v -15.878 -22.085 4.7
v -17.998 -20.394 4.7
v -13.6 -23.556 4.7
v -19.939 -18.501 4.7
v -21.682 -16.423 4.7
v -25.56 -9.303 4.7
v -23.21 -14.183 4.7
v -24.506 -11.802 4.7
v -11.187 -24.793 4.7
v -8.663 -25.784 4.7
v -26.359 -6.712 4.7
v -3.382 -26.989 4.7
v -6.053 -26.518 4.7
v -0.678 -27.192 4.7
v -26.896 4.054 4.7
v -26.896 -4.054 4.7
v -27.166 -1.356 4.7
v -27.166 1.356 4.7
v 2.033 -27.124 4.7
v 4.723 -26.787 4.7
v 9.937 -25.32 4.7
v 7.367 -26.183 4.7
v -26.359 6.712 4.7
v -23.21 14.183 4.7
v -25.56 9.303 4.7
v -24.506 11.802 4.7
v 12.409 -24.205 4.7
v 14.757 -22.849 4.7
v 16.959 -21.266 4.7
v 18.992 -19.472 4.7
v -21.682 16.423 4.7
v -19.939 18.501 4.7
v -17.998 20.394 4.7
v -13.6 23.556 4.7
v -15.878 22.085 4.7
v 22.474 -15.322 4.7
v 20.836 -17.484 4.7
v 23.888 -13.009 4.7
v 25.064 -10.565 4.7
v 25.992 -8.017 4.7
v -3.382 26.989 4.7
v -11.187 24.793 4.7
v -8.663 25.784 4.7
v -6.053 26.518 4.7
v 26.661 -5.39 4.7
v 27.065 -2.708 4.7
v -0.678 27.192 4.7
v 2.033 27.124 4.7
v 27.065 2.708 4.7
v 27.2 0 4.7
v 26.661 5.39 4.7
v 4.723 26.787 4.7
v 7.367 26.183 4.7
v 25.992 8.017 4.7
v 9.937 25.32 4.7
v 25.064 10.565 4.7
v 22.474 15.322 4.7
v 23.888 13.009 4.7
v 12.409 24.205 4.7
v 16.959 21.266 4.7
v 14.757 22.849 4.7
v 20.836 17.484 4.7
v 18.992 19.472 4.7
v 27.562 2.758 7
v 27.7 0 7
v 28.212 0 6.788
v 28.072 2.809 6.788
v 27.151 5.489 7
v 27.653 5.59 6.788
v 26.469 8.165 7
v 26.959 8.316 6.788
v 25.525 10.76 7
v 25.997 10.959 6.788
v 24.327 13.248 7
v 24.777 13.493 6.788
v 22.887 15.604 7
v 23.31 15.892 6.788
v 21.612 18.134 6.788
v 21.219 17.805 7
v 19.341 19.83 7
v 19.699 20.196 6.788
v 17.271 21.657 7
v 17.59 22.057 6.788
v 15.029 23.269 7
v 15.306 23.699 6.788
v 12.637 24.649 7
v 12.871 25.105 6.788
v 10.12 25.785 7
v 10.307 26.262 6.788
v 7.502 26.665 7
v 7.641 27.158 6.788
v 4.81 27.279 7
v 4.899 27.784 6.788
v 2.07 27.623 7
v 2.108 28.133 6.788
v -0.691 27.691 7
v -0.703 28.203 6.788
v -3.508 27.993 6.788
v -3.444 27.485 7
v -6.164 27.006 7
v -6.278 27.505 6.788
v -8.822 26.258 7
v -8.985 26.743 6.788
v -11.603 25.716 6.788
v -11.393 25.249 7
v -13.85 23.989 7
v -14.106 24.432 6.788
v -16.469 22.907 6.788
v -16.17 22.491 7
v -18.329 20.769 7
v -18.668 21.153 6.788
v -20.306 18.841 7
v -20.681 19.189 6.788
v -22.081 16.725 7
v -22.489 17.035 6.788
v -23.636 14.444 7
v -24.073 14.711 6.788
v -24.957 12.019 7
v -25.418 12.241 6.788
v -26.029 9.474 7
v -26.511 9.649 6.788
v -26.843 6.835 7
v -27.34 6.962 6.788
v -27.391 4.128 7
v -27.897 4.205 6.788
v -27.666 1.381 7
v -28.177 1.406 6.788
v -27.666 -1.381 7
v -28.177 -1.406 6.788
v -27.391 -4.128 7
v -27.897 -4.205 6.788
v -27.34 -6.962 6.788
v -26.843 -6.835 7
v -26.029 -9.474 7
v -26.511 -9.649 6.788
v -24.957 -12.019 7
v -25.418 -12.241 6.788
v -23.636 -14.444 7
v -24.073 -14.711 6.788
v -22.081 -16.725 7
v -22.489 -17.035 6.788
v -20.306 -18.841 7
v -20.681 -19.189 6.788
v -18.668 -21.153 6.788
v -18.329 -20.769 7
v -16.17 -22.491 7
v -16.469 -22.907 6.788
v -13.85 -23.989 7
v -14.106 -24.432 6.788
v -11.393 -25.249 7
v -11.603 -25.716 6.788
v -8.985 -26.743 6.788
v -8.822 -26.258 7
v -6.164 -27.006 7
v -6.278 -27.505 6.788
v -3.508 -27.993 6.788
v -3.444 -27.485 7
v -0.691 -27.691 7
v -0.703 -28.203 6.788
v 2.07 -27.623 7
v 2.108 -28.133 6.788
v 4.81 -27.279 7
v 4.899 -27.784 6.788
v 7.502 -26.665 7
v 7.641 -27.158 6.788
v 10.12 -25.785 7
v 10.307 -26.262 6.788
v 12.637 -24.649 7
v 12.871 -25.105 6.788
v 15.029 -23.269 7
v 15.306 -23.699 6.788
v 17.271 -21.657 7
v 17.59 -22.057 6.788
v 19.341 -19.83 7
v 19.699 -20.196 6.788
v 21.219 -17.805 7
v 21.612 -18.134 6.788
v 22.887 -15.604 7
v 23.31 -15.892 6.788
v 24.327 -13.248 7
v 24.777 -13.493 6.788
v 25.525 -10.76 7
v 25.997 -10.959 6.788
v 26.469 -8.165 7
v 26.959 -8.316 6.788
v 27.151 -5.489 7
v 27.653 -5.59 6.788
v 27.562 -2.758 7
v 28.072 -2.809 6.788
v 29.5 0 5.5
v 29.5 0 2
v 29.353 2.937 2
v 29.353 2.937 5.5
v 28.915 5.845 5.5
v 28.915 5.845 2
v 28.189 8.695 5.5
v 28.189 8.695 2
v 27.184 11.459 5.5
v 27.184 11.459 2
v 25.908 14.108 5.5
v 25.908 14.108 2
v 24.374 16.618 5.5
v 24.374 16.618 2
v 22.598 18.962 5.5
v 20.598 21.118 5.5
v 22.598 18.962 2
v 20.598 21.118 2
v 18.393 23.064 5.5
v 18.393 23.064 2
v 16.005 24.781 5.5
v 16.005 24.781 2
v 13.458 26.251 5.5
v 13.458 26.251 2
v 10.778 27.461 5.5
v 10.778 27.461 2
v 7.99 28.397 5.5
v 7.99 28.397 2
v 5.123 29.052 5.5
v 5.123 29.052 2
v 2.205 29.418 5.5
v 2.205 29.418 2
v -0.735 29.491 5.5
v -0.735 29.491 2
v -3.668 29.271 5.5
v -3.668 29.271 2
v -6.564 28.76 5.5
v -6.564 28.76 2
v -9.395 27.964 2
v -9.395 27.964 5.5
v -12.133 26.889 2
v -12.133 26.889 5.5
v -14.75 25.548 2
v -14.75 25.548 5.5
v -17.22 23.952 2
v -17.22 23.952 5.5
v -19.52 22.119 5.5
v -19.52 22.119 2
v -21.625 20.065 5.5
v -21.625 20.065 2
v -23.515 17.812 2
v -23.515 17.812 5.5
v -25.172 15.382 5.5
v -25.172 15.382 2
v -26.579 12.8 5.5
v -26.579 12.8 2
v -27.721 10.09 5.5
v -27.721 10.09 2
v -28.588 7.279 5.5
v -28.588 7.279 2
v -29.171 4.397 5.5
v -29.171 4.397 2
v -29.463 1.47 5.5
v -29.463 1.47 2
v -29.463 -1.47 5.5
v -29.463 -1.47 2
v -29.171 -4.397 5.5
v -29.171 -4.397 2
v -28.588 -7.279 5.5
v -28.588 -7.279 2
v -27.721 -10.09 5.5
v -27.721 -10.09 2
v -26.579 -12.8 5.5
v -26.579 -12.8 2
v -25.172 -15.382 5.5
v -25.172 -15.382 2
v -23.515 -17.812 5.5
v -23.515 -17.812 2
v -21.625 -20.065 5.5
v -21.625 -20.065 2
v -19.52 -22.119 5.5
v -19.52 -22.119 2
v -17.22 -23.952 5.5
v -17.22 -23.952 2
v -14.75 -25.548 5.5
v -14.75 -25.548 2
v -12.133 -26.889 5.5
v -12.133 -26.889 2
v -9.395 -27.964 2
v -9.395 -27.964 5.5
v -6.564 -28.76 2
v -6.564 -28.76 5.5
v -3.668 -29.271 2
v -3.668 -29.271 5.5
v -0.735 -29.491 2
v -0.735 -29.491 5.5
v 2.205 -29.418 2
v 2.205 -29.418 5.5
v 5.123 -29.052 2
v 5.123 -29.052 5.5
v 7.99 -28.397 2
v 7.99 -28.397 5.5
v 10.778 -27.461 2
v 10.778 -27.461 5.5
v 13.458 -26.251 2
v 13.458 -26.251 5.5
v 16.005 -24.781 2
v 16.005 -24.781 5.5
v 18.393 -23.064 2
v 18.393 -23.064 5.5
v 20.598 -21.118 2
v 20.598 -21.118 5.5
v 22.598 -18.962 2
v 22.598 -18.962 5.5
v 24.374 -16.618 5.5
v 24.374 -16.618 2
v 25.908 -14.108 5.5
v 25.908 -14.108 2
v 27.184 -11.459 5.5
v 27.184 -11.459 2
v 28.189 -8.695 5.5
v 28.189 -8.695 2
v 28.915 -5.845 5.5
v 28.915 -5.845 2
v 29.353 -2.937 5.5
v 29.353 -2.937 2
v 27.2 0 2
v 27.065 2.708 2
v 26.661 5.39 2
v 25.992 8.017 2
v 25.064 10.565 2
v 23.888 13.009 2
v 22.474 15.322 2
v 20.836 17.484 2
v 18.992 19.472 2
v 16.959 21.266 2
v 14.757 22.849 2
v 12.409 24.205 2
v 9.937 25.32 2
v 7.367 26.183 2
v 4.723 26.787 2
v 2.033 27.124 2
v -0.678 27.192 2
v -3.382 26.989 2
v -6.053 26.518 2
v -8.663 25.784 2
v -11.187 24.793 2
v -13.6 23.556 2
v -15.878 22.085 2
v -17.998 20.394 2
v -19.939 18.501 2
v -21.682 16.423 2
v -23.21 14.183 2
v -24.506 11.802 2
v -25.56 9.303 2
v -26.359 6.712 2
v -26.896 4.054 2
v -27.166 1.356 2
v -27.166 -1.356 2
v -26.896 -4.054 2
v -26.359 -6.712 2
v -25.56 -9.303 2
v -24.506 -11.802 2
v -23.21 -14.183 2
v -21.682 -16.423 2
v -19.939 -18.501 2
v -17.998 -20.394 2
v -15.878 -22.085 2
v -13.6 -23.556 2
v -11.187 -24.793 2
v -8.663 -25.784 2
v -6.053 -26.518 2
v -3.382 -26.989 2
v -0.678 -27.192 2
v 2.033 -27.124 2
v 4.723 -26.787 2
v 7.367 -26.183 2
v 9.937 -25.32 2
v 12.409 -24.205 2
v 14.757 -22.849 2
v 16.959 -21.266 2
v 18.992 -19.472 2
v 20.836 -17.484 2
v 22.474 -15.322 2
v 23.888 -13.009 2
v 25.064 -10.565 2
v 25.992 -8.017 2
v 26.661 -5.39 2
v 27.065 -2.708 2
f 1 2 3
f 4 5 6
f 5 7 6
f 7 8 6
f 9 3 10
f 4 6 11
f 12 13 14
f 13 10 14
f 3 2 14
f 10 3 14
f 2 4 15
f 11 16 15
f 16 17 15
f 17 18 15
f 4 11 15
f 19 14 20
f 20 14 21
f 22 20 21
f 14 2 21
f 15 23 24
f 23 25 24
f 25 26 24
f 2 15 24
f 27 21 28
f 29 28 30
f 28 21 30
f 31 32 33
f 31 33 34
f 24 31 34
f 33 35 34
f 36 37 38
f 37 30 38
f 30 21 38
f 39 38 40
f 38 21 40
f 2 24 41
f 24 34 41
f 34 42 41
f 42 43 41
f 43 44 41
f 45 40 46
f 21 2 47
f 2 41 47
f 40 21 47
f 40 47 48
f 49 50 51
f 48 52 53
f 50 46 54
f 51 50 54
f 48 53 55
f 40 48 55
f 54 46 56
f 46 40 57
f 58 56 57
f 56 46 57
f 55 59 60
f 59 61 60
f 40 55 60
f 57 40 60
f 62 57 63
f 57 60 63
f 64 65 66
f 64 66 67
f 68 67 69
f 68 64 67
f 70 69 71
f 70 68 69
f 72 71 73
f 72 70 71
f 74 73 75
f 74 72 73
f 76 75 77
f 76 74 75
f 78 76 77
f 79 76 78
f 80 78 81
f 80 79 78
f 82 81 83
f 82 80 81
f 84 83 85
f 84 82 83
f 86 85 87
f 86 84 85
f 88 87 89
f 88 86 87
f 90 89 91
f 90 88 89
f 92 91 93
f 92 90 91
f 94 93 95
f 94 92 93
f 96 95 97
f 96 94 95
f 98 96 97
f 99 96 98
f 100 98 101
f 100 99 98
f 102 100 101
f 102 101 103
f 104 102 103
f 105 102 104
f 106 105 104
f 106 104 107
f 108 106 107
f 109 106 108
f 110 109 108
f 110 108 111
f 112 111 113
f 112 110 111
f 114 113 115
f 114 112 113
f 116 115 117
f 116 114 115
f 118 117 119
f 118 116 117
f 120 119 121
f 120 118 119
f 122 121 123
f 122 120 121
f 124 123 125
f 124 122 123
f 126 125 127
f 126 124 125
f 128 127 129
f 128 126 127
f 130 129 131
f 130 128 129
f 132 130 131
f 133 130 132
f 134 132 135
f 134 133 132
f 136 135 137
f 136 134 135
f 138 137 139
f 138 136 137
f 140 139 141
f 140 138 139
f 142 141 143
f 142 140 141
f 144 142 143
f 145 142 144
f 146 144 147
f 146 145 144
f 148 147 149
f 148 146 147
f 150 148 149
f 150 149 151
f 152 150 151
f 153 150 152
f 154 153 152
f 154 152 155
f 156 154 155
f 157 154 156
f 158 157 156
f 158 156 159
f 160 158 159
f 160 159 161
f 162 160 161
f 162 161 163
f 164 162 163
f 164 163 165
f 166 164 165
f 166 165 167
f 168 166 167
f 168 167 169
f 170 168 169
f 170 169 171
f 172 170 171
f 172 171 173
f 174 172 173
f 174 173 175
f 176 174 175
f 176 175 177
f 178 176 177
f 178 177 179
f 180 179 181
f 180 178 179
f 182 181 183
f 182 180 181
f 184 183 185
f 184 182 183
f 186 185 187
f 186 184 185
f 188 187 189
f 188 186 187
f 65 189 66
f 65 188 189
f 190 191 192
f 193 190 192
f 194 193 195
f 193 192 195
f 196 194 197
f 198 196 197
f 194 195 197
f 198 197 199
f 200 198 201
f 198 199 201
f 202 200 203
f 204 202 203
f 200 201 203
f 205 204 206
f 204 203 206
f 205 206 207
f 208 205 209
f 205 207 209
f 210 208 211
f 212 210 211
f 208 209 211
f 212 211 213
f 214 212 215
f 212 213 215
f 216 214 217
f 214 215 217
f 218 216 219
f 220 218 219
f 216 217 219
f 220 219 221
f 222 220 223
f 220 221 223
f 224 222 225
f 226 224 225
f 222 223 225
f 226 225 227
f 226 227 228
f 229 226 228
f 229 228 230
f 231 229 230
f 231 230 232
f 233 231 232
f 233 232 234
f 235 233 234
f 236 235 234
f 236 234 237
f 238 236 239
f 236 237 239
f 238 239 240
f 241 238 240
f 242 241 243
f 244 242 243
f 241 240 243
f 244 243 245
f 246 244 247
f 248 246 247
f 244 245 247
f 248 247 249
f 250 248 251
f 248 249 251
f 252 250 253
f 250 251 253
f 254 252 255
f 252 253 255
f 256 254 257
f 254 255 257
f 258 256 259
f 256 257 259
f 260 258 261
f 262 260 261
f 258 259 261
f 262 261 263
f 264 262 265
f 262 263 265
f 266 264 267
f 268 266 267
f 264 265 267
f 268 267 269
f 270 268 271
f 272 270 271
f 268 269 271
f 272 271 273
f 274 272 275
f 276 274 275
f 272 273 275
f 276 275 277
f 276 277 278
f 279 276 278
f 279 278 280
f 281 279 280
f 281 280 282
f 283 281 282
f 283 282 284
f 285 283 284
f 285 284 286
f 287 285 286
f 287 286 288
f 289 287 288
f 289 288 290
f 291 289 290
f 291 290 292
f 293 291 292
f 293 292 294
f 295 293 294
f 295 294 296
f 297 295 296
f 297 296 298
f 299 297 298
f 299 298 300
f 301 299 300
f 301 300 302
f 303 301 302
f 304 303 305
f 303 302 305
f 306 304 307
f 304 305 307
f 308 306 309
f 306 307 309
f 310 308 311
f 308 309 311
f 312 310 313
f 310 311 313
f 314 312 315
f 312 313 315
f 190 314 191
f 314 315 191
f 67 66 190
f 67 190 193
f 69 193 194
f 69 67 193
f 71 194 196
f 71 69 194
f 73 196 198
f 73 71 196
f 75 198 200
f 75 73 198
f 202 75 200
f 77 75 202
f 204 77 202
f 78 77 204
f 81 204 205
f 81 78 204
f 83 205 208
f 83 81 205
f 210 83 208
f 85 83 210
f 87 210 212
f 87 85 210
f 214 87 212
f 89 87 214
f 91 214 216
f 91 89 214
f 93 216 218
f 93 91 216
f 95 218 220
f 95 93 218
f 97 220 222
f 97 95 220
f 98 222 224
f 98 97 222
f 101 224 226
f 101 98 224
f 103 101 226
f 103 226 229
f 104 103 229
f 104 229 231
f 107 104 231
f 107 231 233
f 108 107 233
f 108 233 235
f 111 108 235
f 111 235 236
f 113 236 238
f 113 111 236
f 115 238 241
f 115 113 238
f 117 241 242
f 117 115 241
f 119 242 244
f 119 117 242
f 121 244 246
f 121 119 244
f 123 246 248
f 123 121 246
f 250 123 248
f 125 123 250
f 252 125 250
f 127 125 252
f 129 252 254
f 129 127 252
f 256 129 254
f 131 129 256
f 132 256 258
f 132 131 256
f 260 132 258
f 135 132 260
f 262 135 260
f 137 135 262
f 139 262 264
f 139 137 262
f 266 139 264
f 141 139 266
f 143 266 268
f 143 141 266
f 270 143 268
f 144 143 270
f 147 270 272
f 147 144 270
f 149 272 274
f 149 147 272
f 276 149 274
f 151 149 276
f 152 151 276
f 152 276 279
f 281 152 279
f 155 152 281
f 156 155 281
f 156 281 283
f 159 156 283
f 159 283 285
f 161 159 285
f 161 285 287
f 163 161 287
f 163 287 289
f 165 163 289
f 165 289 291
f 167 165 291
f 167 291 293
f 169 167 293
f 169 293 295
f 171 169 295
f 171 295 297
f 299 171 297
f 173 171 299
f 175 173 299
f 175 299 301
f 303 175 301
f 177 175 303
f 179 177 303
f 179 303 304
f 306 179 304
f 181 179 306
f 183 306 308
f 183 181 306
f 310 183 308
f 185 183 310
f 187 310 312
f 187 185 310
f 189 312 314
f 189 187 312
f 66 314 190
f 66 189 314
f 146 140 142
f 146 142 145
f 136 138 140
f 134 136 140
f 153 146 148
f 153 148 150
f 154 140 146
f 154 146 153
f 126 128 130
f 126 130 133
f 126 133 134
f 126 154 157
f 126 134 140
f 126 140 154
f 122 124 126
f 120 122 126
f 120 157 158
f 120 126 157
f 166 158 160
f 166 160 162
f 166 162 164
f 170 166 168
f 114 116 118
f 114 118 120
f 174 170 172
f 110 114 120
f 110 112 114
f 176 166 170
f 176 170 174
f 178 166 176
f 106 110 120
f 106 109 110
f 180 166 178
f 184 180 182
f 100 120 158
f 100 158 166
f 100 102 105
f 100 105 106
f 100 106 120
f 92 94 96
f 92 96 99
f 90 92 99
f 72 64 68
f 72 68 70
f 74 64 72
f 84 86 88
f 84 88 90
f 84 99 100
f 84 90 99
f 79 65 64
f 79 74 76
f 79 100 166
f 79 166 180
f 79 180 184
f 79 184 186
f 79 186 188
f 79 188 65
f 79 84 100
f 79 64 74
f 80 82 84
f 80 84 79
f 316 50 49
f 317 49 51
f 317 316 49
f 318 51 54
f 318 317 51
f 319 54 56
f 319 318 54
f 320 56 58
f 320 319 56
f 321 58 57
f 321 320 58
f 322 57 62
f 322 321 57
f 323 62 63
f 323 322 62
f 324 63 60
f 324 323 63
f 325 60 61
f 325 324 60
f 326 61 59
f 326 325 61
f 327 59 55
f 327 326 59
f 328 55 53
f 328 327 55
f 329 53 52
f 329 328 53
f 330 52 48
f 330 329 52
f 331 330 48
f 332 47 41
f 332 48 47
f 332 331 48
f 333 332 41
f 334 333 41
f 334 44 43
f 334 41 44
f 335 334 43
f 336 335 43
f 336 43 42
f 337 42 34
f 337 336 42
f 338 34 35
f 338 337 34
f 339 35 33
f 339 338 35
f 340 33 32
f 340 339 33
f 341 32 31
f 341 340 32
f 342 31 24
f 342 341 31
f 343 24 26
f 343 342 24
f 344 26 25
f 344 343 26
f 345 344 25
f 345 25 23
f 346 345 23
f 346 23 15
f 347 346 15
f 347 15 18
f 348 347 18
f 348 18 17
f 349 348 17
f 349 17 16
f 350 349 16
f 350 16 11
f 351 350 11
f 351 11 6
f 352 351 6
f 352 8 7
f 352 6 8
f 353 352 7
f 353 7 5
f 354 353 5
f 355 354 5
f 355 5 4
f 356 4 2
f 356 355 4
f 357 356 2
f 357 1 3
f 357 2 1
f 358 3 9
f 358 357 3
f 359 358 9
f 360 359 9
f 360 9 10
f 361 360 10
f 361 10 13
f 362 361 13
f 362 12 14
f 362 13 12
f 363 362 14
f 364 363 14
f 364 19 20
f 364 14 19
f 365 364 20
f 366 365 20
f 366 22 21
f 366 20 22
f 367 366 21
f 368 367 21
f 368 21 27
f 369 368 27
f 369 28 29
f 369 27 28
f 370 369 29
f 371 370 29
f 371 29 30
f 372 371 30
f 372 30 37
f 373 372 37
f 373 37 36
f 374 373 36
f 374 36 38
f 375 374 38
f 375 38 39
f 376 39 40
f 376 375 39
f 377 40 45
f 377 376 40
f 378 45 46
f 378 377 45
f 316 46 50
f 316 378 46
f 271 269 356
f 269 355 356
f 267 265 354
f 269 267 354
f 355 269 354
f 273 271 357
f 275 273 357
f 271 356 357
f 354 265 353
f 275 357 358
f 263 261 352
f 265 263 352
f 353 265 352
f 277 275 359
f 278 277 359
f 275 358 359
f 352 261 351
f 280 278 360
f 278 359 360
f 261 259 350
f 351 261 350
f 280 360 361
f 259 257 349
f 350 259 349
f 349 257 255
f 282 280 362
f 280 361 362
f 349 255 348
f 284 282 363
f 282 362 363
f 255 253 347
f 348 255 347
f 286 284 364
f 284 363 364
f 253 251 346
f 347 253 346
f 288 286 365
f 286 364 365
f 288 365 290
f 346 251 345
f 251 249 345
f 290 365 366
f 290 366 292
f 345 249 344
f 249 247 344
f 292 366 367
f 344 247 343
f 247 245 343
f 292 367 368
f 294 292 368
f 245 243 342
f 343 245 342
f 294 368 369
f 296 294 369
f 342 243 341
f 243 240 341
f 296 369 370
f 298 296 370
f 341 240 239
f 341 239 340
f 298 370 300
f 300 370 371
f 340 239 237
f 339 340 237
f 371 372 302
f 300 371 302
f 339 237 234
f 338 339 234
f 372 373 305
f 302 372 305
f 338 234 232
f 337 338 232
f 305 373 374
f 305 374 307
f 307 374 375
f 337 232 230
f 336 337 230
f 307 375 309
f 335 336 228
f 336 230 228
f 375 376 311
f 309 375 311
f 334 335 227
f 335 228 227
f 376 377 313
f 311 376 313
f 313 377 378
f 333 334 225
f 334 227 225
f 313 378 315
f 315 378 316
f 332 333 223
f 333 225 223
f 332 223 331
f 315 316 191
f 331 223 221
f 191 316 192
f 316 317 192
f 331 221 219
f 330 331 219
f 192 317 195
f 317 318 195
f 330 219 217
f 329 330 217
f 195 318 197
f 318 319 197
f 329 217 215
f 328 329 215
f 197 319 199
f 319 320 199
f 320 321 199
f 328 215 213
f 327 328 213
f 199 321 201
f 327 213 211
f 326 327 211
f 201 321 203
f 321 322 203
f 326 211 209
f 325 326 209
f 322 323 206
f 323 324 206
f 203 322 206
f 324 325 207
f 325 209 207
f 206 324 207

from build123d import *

# Parameters (mm, degrees)
SKETCH006_R     = 29.5
PAD004_DEPTH    = 5
THICKNESS_T     = -2.3
CHAMFER_SIZE    = 1.5
CHAMFER001_SIZE = 0.3


with BuildPart() as part:
    # Sketch006 → Pad004 (new body)
    with BuildSketch(Plane.XY):
        Circle(SKETCH006_R)
    extrude(amount=PAD004_DEPTH)

    # Thickness
    thickness_openings = [part.faces().sort_by_distance(p)[0] for p in [
        (0, 0, 0),
    ]]
    offset(amount=THICKNESS_T, openings=thickness_openings)

    # Chamfer
    chamfer_edges = [part.edges().sort_by_distance(p)[0] for p in [
        (-29.5, 0, 5),
    ]]
    chamfer(chamfer_edges, length=CHAMFER_SIZE)

    # Chamfer001
    chamfer001_edges = [part.edges().sort_by_distance(p)[0] for p in [
        (-28, 0, 5),
    ]]
    chamfer(chamfer001_edges, length=CHAMFER001_SIZE)


with BuildPart() as part_1:
    # Body002 placement: moved
    add(part.part.moved(Location((0, 0, 2))))


solid = part_1.part
